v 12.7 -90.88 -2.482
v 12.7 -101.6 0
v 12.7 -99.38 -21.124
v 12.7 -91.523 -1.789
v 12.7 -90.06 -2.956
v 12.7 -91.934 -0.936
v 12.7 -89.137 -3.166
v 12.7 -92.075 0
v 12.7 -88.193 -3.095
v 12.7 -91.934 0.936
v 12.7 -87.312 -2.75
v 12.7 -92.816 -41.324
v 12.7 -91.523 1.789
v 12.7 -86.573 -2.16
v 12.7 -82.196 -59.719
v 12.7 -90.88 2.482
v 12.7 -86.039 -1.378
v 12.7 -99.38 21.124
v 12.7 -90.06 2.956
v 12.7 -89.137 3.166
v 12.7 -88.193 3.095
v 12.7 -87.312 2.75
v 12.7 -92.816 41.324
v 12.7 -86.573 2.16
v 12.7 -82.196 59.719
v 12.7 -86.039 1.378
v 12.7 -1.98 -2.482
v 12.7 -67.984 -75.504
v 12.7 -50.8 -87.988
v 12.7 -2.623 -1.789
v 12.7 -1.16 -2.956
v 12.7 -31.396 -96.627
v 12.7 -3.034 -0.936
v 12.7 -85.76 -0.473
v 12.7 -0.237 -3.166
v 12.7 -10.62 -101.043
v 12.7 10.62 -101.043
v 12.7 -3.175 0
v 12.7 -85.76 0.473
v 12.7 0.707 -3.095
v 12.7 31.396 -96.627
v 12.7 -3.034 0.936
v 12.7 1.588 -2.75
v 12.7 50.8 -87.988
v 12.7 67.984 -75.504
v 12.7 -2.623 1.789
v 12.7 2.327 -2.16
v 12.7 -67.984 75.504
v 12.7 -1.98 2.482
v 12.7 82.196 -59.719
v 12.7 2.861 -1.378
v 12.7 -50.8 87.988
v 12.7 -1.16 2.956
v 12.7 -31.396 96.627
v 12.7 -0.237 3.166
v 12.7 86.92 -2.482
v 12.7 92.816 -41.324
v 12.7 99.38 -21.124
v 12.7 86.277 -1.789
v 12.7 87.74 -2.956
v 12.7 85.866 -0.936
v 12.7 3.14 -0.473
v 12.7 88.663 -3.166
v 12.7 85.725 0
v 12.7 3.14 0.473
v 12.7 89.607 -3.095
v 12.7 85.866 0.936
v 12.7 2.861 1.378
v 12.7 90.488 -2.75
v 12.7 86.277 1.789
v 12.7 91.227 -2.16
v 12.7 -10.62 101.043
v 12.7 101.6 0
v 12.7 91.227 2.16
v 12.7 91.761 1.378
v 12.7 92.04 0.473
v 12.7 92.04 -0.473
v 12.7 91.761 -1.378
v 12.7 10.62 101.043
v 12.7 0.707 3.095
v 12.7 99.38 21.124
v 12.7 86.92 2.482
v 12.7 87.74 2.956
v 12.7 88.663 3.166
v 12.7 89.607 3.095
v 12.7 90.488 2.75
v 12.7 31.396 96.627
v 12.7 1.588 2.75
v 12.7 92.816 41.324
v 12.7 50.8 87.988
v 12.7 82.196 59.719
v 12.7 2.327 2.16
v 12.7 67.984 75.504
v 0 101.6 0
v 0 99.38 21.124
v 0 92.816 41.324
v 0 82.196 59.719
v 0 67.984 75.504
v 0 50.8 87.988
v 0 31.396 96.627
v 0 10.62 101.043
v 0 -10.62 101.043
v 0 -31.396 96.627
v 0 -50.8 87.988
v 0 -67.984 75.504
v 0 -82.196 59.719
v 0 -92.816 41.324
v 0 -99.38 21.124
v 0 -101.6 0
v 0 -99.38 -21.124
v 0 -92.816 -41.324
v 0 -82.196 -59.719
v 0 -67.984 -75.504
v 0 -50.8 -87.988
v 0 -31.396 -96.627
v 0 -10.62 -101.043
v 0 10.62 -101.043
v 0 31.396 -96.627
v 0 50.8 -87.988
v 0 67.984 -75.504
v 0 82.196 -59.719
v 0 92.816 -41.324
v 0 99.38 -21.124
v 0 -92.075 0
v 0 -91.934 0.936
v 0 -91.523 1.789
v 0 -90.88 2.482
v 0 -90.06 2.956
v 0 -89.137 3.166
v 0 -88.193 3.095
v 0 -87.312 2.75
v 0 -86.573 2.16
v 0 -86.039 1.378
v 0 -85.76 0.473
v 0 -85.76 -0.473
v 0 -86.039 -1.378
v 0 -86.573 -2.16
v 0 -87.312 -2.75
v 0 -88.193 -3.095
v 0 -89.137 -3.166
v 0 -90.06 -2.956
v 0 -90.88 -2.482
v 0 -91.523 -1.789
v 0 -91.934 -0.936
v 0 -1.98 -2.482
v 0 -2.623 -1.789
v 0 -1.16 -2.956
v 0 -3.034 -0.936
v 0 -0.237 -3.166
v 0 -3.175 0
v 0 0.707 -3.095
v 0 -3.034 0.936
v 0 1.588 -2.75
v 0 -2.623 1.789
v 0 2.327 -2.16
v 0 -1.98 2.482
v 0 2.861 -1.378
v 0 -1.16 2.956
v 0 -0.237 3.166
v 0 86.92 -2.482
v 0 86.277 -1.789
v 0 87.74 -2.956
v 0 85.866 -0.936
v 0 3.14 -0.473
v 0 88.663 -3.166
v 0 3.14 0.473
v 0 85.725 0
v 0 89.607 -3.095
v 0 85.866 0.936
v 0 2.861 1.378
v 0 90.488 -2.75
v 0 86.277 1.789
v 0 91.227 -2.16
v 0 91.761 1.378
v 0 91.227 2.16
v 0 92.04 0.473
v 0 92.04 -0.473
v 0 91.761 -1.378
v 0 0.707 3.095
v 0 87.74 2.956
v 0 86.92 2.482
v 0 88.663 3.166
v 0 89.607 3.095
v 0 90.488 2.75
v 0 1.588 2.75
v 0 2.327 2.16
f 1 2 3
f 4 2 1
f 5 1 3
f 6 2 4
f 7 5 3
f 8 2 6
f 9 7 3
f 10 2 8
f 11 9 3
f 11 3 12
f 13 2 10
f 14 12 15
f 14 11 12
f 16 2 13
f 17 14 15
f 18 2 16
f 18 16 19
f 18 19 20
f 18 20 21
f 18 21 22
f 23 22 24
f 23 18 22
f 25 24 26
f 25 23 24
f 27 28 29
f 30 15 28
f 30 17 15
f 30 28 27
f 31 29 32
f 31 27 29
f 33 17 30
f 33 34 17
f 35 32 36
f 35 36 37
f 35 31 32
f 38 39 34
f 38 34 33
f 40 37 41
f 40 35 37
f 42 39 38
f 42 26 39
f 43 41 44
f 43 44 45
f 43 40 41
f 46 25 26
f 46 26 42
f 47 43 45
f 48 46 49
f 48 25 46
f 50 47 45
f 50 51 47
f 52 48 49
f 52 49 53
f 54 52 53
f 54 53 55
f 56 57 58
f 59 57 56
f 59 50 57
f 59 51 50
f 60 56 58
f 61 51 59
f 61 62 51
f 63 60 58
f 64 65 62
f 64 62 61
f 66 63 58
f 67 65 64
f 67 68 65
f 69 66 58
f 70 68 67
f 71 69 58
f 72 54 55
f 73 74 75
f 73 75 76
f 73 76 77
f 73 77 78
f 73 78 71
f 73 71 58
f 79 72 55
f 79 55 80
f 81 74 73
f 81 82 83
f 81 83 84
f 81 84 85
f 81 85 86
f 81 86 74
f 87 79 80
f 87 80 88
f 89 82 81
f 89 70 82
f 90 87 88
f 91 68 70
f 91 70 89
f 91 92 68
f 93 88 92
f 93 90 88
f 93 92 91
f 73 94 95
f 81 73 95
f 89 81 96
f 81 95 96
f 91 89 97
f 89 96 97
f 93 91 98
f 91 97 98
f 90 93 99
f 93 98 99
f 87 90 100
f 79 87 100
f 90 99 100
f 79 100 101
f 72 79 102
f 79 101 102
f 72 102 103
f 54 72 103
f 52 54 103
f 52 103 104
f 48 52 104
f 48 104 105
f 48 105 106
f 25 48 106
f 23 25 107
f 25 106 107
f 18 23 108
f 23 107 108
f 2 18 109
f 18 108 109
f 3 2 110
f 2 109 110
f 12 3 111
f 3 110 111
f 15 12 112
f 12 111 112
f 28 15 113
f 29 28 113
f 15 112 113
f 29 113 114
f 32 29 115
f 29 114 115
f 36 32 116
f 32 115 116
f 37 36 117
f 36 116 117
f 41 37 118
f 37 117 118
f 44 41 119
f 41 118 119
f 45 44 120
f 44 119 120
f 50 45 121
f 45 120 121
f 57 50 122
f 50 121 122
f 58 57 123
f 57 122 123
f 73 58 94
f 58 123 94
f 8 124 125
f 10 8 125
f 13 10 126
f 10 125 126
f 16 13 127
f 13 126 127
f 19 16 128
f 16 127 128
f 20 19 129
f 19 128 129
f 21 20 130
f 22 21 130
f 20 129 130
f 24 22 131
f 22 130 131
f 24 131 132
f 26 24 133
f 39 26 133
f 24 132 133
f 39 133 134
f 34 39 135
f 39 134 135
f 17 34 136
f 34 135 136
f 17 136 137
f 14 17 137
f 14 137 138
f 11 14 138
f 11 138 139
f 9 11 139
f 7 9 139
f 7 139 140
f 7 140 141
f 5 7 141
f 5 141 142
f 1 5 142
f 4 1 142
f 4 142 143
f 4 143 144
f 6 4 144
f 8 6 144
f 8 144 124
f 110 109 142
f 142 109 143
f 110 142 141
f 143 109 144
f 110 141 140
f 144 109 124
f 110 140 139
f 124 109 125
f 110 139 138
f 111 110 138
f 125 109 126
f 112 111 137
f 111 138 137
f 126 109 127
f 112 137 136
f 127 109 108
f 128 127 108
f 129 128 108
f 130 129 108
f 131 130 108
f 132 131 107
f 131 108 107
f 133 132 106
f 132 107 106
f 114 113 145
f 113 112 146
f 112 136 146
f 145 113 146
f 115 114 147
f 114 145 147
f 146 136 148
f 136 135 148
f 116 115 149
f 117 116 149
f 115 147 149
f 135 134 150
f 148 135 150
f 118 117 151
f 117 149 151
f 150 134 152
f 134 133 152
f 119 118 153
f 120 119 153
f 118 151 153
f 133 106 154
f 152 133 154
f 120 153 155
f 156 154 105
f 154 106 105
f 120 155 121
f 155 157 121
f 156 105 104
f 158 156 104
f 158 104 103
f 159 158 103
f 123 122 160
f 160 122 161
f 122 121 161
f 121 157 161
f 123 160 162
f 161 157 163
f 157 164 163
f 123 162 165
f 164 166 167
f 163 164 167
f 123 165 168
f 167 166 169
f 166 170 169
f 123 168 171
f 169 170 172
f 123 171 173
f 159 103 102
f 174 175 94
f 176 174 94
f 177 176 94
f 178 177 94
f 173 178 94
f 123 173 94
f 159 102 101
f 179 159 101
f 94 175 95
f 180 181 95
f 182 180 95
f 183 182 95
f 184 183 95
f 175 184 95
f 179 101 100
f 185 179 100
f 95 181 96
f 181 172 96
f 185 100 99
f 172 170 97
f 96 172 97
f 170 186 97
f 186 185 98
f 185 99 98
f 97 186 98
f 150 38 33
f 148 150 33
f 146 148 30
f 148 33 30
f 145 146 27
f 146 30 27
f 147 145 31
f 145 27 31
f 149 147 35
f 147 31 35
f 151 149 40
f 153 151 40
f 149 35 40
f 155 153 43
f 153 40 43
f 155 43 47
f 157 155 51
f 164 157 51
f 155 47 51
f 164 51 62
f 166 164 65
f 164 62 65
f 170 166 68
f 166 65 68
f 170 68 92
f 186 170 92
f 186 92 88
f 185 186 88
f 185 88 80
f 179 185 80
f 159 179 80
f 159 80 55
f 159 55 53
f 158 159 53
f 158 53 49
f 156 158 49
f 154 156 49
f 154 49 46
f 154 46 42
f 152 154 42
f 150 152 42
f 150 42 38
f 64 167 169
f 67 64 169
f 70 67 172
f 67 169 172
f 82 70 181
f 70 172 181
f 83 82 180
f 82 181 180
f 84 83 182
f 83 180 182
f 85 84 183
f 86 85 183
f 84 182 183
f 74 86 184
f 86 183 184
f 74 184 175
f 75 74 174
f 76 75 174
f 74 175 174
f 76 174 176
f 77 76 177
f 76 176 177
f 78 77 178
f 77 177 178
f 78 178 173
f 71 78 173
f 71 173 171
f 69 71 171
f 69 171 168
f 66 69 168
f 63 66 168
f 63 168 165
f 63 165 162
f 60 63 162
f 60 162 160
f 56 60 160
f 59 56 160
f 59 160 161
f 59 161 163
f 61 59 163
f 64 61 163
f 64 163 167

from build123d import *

# Parameters (mm, degrees)
F0_R     = 101.6
F2_DEPTH = 12.7
F3_D     = 6.35
F5_D     = 6.35
F7_D     = 6.35


with BuildPart() as f2:
    # F0 (on Right) → F2 (new body)
    with BuildSketch(Plane.YZ):
        Circle(F0_R)
    extrude(amount=F2_DEPTH)

    # F3 (through all)
    with Locations(Plane(origin=(0, 0, 0), x_dir=(0, 1, 0), z_dir=(-1, 0, 0))):
        with Locations((0, 0)):
            Hole(F3_D / 2)

    # F5 (through all)
    with Locations(Plane.YZ.offset(12.7)):
        with Locations((88.9, 0)):
            Hole(F5_D / 2)

    # F7 (through all)
    with Locations(Plane.YZ.offset(12.7)):
        with Locations((-88.9, 0)):
            Hole(F7_D / 2)


solid = f2.part
